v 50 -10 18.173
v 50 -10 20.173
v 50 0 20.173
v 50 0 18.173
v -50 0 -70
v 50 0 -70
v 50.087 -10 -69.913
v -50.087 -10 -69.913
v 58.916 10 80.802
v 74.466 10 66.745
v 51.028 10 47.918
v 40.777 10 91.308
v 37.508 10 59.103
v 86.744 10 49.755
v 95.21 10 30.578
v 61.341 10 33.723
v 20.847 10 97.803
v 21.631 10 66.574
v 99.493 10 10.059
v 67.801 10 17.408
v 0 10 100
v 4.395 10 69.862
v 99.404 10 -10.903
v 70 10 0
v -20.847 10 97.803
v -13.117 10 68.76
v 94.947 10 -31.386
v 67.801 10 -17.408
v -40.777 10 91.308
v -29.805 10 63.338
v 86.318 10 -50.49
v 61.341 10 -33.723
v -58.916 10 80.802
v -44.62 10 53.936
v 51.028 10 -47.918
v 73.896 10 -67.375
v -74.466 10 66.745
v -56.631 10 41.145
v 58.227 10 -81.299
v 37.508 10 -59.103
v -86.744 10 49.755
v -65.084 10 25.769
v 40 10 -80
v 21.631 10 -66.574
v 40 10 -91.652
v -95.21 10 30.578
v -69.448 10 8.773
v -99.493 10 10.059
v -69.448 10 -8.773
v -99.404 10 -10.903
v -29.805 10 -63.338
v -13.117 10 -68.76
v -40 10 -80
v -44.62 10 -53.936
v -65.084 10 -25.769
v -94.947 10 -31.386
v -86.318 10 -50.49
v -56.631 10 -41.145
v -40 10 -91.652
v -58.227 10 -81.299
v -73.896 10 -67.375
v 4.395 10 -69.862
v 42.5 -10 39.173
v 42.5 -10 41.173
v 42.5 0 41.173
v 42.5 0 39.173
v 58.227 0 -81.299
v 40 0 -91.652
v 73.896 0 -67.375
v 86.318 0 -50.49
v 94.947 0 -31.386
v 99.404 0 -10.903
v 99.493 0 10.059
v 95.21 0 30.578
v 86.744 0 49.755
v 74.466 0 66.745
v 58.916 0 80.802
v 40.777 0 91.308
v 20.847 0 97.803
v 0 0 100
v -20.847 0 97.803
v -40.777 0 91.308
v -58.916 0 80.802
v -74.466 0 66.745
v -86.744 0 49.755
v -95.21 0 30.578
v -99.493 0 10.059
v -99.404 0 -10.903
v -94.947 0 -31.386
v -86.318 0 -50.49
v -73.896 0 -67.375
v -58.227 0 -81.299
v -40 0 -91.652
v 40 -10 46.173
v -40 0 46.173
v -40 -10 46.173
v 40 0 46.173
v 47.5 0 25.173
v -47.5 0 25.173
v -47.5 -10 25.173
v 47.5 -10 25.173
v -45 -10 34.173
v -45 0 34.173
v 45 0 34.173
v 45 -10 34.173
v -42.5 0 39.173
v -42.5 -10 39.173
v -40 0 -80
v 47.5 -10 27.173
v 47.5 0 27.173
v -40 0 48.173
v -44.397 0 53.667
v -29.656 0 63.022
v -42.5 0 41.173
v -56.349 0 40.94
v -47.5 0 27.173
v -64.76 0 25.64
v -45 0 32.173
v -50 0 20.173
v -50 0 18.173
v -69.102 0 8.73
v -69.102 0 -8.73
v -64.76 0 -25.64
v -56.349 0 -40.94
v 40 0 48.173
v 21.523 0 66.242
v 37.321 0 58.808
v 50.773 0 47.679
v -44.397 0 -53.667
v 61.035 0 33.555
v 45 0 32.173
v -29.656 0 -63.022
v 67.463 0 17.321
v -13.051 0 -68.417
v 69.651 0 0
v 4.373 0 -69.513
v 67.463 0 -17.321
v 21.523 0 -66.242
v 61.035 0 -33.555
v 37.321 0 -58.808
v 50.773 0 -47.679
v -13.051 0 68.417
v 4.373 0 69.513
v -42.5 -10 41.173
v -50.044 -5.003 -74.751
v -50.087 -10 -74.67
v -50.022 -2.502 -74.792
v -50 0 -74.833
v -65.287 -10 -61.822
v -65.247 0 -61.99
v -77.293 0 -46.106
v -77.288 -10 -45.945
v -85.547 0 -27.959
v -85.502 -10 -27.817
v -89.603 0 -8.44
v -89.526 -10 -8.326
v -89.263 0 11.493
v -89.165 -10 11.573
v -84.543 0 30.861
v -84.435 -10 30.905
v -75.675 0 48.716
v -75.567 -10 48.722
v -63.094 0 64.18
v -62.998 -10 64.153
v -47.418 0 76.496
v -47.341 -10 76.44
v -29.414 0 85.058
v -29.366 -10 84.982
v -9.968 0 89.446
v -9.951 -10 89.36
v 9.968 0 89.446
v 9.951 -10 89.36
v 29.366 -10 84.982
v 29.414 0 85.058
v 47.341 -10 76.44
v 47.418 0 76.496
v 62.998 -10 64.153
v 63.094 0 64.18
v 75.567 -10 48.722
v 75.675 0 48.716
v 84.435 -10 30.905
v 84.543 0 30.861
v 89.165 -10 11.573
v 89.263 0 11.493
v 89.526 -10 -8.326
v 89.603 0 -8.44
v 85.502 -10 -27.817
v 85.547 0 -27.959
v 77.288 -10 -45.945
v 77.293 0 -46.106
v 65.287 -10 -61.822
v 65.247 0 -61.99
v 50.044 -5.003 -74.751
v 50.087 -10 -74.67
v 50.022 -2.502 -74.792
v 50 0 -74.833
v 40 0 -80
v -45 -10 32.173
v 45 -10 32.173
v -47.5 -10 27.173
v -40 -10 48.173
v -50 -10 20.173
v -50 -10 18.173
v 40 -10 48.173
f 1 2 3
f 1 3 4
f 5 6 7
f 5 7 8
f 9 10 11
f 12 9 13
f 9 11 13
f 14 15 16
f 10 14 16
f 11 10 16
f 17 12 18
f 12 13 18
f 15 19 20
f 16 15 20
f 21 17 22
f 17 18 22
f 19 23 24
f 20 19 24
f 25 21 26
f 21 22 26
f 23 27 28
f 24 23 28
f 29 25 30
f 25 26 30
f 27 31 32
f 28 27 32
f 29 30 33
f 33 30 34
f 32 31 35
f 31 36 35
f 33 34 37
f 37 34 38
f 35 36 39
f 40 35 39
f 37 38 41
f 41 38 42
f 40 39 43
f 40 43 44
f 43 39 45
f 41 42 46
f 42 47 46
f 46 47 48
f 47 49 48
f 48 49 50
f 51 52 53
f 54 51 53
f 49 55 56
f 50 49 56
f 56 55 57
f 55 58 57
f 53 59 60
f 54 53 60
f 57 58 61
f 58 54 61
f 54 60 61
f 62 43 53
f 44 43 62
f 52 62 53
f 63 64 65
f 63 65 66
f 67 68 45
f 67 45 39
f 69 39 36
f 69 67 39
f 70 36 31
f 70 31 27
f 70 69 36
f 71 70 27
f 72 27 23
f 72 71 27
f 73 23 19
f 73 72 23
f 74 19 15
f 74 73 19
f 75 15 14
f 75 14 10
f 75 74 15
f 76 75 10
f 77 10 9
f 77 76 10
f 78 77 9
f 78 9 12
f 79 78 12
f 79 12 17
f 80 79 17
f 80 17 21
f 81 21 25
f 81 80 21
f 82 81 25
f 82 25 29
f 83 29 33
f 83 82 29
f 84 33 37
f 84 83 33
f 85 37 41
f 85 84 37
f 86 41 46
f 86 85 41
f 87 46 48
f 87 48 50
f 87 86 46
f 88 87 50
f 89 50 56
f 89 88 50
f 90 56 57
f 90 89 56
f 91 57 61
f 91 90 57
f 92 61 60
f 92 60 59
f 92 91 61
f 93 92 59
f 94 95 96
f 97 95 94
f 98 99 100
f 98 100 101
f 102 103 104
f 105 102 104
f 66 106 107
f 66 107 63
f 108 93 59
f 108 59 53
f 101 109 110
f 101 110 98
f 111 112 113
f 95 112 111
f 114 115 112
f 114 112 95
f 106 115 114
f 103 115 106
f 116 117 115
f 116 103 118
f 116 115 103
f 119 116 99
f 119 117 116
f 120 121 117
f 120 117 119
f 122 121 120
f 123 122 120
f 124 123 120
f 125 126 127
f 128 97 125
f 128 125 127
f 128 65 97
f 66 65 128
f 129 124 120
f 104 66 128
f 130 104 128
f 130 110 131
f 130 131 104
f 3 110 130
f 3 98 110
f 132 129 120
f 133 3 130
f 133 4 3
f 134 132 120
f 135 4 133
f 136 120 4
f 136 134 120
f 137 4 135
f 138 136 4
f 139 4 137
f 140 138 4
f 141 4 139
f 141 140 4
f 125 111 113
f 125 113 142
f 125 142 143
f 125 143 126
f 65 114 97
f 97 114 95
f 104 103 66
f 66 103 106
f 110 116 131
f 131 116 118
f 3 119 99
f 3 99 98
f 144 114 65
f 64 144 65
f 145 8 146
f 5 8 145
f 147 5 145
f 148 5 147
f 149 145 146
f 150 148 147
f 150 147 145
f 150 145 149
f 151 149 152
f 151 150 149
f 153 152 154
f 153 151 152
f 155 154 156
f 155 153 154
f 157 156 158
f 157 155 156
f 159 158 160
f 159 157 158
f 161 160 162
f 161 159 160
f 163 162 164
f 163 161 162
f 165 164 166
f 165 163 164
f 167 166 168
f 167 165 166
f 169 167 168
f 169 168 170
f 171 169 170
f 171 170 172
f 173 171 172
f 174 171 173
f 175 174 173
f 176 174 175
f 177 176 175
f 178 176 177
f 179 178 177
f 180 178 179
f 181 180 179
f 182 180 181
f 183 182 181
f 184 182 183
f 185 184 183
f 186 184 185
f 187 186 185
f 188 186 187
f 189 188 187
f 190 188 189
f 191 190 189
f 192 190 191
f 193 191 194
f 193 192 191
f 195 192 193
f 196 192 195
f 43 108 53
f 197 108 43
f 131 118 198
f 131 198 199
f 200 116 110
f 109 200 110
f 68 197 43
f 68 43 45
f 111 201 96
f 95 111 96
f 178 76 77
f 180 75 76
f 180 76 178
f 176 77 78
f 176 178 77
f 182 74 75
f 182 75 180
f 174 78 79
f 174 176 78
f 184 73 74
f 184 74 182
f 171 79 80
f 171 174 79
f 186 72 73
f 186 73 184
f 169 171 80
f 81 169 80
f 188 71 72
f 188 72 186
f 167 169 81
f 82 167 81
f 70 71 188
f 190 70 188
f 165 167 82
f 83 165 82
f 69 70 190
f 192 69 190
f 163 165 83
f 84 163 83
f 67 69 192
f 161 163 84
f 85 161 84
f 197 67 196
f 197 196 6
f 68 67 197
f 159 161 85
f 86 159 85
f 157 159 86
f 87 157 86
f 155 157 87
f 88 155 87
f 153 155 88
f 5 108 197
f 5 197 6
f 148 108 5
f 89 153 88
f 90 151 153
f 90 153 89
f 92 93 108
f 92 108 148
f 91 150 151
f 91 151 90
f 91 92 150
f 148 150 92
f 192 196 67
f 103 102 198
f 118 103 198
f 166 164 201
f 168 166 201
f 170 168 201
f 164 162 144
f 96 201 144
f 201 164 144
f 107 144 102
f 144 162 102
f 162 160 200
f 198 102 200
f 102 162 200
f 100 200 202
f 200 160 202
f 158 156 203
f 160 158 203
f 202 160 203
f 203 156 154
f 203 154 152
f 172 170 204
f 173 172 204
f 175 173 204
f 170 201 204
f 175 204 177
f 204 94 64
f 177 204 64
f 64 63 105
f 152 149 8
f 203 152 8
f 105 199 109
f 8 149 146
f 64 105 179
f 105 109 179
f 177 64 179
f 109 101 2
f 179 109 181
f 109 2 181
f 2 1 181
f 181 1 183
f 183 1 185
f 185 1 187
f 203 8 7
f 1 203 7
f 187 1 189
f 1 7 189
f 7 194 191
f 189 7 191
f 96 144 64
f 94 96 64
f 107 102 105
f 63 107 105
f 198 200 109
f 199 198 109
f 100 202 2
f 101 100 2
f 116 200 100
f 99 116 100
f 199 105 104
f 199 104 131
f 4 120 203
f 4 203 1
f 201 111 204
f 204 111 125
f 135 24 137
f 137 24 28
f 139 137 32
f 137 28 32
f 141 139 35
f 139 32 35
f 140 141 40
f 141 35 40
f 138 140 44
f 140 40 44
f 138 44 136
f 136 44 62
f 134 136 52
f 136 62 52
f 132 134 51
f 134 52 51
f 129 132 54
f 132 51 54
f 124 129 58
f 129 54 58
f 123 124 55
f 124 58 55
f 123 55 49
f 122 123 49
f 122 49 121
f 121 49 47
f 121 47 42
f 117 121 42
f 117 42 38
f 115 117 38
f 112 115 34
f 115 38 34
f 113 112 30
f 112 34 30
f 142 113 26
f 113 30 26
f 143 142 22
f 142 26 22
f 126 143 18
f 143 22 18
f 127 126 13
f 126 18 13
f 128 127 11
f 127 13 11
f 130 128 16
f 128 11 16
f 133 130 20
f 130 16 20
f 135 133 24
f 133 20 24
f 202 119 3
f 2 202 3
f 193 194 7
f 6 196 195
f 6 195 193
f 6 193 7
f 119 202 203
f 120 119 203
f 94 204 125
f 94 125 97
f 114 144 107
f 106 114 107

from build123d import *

# Parameters (mm, degrees)
BOSS_EXTRUDE1_DEPTH = 10
BOSS_EXTRUDE1_DRAFT = -0.5
BOSS_EXTRUDE2_DEPTH = 10
SKETCH3_W           = 100
SKETCH3_H           = 2
SKETCH3_W_2         = 95
SKETCH3_W_3         = 90
SKETCH3_W_4         = 85
SKETCH3_W_5         = 80
CUT_EXTRUDE1_DEPTH  = 143.828568571
SKETCH4_R           = 70
CUT_EXTRUDE2_DEPTH  = 10
CUT_EXTRUDE2_DRAFT  = -2


with BuildPart() as part:
    # Sketch1 → Boss-Extrude1 (with draft: the straight prism first)
    with BuildSketch(Plane(origin=(0, 0, 0), x_dir=(1, 0, 0), z_dir=(0, 1, 0))):
        with BuildLine():
            ThreePointArc((-50, 74.833147735), (0, -90), (50, 74.833147735))
            Line((50, 74.833147735), (50, 70))
            Line((50, 70), (-50, 70))
            Line((-50, 70), (-50, 74.833147735))
        make_face()
    extrude(amount=-BOSS_EXTRUDE1_DEPTH)
    # Boss-Extrude1: the draft: its side faces are tilted about the plane it starts from
    boss_extrude1_sides = [part.faces().sort_by_distance(p)[0] for p in [
        (50, -5, -72.416573868),
        (0, -5, -70),
        (-50, -5, -72.416573868),
        (0, -5, 90),
    ]]
    draft(boss_extrude1_sides, Plane(origin=(0, 0, 0), x_dir=(1, 0, 0), z_dir=(0, 1, 0)), BOSS_EXTRUDE1_DRAFT)

    # Sketch2 → Boss-Extrude2 (add)
    with BuildSketch(Plane(origin=(0, 0, 0), x_dir=(1, 0, 0), z_dir=(0, 1, 0))):
        with BuildLine():
            Line((-40, 91.651513899), (-40, 80))
            Line((-40, 80), (40, 80))
            Line((40, 80), (40, 91.651513899))
            ThreePointArc((40, 91.651513899), (0, -100), (-40, 91.651513899))
        make_face()
    extrude(amount=BOSS_EXTRUDE2_DEPTH)

    # Sketch3 → Cut-Extrude1 (cut, through all)
    with BuildSketch(Plane(origin=(0, 10, 0), x_dir=(1, 0, 0), z_dir=(0, 1, 0))):
        with Locations((0, -19.17330362)):
            Rectangle(SKETCH3_W, SKETCH3_H)
        with Locations((0, -26.17330362)):
            Rectangle(SKETCH3_W_2, SKETCH3_H)
        with Locations((0, -33.17330362)):
            Rectangle(SKETCH3_W_3, SKETCH3_H)
        with Locations((0, -40.17330362)):
            Rectangle(SKETCH3_W_4, SKETCH3_H)
        with Locations((0, -47.17330362)):
            Rectangle(SKETCH3_W_5, SKETCH3_H)
    extrude(amount=-CUT_EXTRUDE1_DEPTH, mode=Mode.SUBTRACT)


with BuildPart() as cut_extrude2_tool:
    # Sketch4 → Cut-Extrude2 (with draft: the straight prism first)
    with BuildSketch(Plane(origin=(0, 10, 0), x_dir=(1, 0, 0), z_dir=(0, 1, 0))):
        Circle(SKETCH4_R)
    extrude(amount=-CUT_EXTRUDE2_DEPTH)
    # Cut-Extrude2: the draft: its side faces are tilted about the plane it starts from
    cut_extrude2_sides = [cut_extrude2_tool.faces().sort_by_distance(p)[0] for p in [
        (-70, 5, 0),
    ]]
    draft(cut_extrude2_sides, Plane(origin=(0, 10, 0), x_dir=(1, 0, 0), z_dir=(0, 1, 0)), CUT_EXTRUDE2_DRAFT)


with BuildPart() as part_1:
    add(part.part)

    # Cut-Extrude2: cut by cut_extrude2_tool
    add(cut_extrude2_tool.part, mode=Mode.SUBTRACT)


solid = part_1.part
